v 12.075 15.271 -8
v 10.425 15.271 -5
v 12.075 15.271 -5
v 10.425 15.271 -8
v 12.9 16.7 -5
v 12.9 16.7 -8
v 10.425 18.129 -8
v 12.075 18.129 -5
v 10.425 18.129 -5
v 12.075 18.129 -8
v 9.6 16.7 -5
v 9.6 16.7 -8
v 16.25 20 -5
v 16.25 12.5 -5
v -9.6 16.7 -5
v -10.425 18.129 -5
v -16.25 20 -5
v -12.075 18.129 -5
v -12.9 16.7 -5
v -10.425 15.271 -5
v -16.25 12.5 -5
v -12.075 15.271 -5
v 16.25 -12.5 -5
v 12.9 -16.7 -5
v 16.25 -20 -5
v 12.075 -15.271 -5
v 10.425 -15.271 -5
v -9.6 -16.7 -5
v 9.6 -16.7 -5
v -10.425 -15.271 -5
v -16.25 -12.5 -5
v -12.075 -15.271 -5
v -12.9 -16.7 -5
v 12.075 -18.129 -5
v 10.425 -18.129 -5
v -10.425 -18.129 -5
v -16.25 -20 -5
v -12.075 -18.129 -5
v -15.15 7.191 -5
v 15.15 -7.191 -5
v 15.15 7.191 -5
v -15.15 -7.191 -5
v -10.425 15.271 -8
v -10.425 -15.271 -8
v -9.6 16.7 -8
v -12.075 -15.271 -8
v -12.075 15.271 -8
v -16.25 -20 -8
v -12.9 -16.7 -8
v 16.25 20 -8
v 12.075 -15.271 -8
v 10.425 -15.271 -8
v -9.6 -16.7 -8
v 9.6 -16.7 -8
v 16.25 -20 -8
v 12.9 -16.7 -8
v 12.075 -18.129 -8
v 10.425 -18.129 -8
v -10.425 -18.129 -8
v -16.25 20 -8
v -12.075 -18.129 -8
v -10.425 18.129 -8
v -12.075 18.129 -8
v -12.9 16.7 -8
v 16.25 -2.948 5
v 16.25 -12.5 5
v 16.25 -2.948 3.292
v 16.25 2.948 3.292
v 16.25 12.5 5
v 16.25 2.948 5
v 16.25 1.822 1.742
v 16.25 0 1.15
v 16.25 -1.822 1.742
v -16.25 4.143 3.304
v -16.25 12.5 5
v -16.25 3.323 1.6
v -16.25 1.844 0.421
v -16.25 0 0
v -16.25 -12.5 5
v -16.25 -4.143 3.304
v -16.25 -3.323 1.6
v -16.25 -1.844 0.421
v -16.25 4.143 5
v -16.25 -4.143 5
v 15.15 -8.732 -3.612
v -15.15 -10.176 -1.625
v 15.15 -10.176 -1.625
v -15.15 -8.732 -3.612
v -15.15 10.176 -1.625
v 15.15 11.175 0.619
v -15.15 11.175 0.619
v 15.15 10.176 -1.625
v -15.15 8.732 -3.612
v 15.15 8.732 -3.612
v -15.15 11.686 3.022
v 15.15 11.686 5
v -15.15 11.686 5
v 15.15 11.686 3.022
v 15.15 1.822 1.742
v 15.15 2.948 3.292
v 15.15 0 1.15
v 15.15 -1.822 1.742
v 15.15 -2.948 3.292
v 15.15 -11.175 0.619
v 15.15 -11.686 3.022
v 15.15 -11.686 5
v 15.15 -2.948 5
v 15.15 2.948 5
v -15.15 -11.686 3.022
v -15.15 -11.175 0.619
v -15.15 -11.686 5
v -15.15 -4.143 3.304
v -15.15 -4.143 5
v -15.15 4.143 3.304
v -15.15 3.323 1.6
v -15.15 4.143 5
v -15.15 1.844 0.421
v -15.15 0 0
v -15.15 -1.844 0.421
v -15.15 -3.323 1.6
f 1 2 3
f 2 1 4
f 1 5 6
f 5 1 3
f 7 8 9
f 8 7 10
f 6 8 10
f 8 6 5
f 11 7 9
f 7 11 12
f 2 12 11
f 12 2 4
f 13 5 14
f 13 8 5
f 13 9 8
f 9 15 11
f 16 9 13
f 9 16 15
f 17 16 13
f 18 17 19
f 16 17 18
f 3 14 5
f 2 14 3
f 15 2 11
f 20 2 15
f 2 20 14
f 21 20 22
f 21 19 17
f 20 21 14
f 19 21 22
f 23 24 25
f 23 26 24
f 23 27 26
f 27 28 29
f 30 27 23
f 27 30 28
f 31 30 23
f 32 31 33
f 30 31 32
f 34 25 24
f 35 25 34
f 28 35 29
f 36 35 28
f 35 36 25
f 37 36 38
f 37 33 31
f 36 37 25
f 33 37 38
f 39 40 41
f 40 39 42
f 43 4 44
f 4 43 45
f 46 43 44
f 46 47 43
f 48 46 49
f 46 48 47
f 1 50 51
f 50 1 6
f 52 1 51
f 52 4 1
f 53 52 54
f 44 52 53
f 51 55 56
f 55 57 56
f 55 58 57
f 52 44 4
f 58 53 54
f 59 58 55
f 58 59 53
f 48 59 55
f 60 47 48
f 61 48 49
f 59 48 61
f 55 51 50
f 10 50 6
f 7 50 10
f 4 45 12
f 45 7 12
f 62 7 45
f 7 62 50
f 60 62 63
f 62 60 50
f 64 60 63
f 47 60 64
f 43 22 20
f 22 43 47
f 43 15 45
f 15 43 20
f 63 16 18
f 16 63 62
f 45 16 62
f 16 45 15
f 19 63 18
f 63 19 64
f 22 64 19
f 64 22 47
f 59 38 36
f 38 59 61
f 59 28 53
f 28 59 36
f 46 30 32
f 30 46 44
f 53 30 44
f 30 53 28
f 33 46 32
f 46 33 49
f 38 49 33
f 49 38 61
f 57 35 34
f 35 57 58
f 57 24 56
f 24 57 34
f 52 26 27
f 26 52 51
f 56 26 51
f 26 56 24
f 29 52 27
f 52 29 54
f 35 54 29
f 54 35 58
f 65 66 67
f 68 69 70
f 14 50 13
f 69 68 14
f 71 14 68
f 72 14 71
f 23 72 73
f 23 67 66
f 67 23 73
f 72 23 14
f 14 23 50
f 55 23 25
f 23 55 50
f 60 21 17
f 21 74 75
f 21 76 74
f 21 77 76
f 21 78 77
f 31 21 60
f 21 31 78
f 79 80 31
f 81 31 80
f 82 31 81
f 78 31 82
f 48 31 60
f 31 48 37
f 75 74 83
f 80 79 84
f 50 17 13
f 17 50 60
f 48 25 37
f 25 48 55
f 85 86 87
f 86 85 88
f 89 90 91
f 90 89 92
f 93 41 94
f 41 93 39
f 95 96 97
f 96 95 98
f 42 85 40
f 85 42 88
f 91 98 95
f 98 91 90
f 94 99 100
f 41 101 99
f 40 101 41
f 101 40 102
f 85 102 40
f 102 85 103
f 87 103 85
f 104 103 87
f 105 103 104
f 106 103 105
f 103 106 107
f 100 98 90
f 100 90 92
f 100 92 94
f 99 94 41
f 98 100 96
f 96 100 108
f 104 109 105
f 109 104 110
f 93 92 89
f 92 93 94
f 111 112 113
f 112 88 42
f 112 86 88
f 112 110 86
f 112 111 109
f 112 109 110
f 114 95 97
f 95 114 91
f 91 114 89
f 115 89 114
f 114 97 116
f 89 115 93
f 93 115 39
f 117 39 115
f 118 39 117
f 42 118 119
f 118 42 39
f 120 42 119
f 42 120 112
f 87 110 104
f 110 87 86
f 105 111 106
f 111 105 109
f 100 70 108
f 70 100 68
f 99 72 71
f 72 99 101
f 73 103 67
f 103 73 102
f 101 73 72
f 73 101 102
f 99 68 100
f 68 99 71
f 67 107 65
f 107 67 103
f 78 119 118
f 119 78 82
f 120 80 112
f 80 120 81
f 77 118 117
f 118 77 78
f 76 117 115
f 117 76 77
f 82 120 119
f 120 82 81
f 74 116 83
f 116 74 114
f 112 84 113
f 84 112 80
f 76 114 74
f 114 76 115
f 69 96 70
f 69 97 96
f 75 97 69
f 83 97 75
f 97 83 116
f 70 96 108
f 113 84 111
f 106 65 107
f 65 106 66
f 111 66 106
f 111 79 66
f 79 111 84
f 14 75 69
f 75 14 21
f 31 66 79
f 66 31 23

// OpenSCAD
// file: JohnsonNF243G-20242.scad
/*
	Openscat modell for Johnson NF243G-20242 Motor

	2015 by ChrisMicro

*/

//$fn=100; // resolution

motorDiameter   = 23.5;
motorHeight     = 18.5;
motorBodyLength = 30.3;

axisLength      = 20;
axisTotalLength = 55;
axisDiameter    = 2;

frontRingDiameter = 6.2;
frontRingLength   = 1.2;

backRingDiameter  = 8.5;
backRingLength    = 1.7;

ringInlayOffset=2; // this is only to prevent rendering errors
 
motor();



axisShift=axisTotalLength-(motorBodyLength+frontRingLength+axisLength);


module motor()
{
	// front ring
	translate([motorBodyLength/2-ringInlayOffset,0,0]) rotate([0,90,0])	
		cylinder(h = frontRingLength+ringInlayOffset, r = frontRingDiameter/2, center = false);

	// back ring
	translate([-motorBodyLength/2-backRingLength,0,0]) rotate([0,90,0])	
		cylinder(h = backRingLength+ringInlayOffset, r = backRingDiameter/2, center = false);

	// axis
	color("grey") translate([-motorBodyLength/2-axisShift,0,0]) rotate([0,90,0])	
		cylinder(h = axisTotalLength, r = axisDiameter/2, center = false);

	// body
	color("grey") intersection()
	{
		translate([-motorBodyLength/2,0,0]) rotate([0,90,0])	
			cylinder(h = motorBodyLength, r = motorDiameter/2, center = false);
			cube(size = [motorBodyLength,motorDiameter,motorHeight], center = true);
	}
}
// main file
use <JohnsonNF243G-20242.scad>

MotorholderLength = 32.5;
MotorholderHeight = 10;
MotorHolderWitdh  = 25;

basePlateLength   = MotorholderLength;
basePlateWidth    = 40;
basePlateHeight   = 3;


drilldiameter = 3.3/2;
drillPositionBorderDistance = 5 ;

motorDiameter   = 23.5;
motorHeight     = 18.5;


basePlateOffset=-MotorholderHeight/2-basePlateHeight/2;

// drilling coordinates
x0=basePlateLength/2-drillPositionBorderDistance;
y0=MotorHolderWitdh-drillPositionBorderDistance-drilldiameter*2;

x1=-basePlateLength/2+drillPositionBorderDistance;
y1=(MotorHolderWitdh-drillPositionBorderDistance-drilldiameter*2);

x2=-basePlateLength/2+drillPositionBorderDistance;
y2=-(MotorHolderWitdh-drillPositionBorderDistance-drilldiameter*2);

x3=basePlateLength/2-drillPositionBorderDistance;
y3=-(MotorHolderWitdh-drillPositionBorderDistance-drilldiameter*2);

module basePlate()
{
	difference()
	{
	// baseplate
	color("silver") translate([0,0,basePlateOffset]) 		
		cube(size = [basePlateLength,basePlateWidth,basePlateHeight], center = true);

	// baseplate drillings
	union(){
		// drill 0
		translate([x0,y0,basePlateOffset-basePlateHeight/2]) 		
			cylinder(basePlateHeight,drilldiameter,drilldiameter);

		// drill 1
		translate([x1,y1,basePlateOffset-basePlateHeight/2]) 		
			cylinder(basePlateHeight,drilldiameter,drilldiameter);

		// drill 2
		translate([x2,y2,basePlateOffset-basePlateHeight/2]) 		
			cylinder(basePlateHeight,drilldiameter,drilldiameter);

		// drill 3
		translate([x3,y3,basePlateOffset-basePlateHeight/2]) 		
			cylinder(basePlateHeight,drilldiameter,drilldiameter);
	}
}
}
	
basePlate();


difference()
{
	cube(size = [MotorholderLength,MotorHolderWitdh,MotorholderHeight], center = true);
	translate([0,0,motorHeight/2-MotorholderHeight/2]) 
		motor();
}
